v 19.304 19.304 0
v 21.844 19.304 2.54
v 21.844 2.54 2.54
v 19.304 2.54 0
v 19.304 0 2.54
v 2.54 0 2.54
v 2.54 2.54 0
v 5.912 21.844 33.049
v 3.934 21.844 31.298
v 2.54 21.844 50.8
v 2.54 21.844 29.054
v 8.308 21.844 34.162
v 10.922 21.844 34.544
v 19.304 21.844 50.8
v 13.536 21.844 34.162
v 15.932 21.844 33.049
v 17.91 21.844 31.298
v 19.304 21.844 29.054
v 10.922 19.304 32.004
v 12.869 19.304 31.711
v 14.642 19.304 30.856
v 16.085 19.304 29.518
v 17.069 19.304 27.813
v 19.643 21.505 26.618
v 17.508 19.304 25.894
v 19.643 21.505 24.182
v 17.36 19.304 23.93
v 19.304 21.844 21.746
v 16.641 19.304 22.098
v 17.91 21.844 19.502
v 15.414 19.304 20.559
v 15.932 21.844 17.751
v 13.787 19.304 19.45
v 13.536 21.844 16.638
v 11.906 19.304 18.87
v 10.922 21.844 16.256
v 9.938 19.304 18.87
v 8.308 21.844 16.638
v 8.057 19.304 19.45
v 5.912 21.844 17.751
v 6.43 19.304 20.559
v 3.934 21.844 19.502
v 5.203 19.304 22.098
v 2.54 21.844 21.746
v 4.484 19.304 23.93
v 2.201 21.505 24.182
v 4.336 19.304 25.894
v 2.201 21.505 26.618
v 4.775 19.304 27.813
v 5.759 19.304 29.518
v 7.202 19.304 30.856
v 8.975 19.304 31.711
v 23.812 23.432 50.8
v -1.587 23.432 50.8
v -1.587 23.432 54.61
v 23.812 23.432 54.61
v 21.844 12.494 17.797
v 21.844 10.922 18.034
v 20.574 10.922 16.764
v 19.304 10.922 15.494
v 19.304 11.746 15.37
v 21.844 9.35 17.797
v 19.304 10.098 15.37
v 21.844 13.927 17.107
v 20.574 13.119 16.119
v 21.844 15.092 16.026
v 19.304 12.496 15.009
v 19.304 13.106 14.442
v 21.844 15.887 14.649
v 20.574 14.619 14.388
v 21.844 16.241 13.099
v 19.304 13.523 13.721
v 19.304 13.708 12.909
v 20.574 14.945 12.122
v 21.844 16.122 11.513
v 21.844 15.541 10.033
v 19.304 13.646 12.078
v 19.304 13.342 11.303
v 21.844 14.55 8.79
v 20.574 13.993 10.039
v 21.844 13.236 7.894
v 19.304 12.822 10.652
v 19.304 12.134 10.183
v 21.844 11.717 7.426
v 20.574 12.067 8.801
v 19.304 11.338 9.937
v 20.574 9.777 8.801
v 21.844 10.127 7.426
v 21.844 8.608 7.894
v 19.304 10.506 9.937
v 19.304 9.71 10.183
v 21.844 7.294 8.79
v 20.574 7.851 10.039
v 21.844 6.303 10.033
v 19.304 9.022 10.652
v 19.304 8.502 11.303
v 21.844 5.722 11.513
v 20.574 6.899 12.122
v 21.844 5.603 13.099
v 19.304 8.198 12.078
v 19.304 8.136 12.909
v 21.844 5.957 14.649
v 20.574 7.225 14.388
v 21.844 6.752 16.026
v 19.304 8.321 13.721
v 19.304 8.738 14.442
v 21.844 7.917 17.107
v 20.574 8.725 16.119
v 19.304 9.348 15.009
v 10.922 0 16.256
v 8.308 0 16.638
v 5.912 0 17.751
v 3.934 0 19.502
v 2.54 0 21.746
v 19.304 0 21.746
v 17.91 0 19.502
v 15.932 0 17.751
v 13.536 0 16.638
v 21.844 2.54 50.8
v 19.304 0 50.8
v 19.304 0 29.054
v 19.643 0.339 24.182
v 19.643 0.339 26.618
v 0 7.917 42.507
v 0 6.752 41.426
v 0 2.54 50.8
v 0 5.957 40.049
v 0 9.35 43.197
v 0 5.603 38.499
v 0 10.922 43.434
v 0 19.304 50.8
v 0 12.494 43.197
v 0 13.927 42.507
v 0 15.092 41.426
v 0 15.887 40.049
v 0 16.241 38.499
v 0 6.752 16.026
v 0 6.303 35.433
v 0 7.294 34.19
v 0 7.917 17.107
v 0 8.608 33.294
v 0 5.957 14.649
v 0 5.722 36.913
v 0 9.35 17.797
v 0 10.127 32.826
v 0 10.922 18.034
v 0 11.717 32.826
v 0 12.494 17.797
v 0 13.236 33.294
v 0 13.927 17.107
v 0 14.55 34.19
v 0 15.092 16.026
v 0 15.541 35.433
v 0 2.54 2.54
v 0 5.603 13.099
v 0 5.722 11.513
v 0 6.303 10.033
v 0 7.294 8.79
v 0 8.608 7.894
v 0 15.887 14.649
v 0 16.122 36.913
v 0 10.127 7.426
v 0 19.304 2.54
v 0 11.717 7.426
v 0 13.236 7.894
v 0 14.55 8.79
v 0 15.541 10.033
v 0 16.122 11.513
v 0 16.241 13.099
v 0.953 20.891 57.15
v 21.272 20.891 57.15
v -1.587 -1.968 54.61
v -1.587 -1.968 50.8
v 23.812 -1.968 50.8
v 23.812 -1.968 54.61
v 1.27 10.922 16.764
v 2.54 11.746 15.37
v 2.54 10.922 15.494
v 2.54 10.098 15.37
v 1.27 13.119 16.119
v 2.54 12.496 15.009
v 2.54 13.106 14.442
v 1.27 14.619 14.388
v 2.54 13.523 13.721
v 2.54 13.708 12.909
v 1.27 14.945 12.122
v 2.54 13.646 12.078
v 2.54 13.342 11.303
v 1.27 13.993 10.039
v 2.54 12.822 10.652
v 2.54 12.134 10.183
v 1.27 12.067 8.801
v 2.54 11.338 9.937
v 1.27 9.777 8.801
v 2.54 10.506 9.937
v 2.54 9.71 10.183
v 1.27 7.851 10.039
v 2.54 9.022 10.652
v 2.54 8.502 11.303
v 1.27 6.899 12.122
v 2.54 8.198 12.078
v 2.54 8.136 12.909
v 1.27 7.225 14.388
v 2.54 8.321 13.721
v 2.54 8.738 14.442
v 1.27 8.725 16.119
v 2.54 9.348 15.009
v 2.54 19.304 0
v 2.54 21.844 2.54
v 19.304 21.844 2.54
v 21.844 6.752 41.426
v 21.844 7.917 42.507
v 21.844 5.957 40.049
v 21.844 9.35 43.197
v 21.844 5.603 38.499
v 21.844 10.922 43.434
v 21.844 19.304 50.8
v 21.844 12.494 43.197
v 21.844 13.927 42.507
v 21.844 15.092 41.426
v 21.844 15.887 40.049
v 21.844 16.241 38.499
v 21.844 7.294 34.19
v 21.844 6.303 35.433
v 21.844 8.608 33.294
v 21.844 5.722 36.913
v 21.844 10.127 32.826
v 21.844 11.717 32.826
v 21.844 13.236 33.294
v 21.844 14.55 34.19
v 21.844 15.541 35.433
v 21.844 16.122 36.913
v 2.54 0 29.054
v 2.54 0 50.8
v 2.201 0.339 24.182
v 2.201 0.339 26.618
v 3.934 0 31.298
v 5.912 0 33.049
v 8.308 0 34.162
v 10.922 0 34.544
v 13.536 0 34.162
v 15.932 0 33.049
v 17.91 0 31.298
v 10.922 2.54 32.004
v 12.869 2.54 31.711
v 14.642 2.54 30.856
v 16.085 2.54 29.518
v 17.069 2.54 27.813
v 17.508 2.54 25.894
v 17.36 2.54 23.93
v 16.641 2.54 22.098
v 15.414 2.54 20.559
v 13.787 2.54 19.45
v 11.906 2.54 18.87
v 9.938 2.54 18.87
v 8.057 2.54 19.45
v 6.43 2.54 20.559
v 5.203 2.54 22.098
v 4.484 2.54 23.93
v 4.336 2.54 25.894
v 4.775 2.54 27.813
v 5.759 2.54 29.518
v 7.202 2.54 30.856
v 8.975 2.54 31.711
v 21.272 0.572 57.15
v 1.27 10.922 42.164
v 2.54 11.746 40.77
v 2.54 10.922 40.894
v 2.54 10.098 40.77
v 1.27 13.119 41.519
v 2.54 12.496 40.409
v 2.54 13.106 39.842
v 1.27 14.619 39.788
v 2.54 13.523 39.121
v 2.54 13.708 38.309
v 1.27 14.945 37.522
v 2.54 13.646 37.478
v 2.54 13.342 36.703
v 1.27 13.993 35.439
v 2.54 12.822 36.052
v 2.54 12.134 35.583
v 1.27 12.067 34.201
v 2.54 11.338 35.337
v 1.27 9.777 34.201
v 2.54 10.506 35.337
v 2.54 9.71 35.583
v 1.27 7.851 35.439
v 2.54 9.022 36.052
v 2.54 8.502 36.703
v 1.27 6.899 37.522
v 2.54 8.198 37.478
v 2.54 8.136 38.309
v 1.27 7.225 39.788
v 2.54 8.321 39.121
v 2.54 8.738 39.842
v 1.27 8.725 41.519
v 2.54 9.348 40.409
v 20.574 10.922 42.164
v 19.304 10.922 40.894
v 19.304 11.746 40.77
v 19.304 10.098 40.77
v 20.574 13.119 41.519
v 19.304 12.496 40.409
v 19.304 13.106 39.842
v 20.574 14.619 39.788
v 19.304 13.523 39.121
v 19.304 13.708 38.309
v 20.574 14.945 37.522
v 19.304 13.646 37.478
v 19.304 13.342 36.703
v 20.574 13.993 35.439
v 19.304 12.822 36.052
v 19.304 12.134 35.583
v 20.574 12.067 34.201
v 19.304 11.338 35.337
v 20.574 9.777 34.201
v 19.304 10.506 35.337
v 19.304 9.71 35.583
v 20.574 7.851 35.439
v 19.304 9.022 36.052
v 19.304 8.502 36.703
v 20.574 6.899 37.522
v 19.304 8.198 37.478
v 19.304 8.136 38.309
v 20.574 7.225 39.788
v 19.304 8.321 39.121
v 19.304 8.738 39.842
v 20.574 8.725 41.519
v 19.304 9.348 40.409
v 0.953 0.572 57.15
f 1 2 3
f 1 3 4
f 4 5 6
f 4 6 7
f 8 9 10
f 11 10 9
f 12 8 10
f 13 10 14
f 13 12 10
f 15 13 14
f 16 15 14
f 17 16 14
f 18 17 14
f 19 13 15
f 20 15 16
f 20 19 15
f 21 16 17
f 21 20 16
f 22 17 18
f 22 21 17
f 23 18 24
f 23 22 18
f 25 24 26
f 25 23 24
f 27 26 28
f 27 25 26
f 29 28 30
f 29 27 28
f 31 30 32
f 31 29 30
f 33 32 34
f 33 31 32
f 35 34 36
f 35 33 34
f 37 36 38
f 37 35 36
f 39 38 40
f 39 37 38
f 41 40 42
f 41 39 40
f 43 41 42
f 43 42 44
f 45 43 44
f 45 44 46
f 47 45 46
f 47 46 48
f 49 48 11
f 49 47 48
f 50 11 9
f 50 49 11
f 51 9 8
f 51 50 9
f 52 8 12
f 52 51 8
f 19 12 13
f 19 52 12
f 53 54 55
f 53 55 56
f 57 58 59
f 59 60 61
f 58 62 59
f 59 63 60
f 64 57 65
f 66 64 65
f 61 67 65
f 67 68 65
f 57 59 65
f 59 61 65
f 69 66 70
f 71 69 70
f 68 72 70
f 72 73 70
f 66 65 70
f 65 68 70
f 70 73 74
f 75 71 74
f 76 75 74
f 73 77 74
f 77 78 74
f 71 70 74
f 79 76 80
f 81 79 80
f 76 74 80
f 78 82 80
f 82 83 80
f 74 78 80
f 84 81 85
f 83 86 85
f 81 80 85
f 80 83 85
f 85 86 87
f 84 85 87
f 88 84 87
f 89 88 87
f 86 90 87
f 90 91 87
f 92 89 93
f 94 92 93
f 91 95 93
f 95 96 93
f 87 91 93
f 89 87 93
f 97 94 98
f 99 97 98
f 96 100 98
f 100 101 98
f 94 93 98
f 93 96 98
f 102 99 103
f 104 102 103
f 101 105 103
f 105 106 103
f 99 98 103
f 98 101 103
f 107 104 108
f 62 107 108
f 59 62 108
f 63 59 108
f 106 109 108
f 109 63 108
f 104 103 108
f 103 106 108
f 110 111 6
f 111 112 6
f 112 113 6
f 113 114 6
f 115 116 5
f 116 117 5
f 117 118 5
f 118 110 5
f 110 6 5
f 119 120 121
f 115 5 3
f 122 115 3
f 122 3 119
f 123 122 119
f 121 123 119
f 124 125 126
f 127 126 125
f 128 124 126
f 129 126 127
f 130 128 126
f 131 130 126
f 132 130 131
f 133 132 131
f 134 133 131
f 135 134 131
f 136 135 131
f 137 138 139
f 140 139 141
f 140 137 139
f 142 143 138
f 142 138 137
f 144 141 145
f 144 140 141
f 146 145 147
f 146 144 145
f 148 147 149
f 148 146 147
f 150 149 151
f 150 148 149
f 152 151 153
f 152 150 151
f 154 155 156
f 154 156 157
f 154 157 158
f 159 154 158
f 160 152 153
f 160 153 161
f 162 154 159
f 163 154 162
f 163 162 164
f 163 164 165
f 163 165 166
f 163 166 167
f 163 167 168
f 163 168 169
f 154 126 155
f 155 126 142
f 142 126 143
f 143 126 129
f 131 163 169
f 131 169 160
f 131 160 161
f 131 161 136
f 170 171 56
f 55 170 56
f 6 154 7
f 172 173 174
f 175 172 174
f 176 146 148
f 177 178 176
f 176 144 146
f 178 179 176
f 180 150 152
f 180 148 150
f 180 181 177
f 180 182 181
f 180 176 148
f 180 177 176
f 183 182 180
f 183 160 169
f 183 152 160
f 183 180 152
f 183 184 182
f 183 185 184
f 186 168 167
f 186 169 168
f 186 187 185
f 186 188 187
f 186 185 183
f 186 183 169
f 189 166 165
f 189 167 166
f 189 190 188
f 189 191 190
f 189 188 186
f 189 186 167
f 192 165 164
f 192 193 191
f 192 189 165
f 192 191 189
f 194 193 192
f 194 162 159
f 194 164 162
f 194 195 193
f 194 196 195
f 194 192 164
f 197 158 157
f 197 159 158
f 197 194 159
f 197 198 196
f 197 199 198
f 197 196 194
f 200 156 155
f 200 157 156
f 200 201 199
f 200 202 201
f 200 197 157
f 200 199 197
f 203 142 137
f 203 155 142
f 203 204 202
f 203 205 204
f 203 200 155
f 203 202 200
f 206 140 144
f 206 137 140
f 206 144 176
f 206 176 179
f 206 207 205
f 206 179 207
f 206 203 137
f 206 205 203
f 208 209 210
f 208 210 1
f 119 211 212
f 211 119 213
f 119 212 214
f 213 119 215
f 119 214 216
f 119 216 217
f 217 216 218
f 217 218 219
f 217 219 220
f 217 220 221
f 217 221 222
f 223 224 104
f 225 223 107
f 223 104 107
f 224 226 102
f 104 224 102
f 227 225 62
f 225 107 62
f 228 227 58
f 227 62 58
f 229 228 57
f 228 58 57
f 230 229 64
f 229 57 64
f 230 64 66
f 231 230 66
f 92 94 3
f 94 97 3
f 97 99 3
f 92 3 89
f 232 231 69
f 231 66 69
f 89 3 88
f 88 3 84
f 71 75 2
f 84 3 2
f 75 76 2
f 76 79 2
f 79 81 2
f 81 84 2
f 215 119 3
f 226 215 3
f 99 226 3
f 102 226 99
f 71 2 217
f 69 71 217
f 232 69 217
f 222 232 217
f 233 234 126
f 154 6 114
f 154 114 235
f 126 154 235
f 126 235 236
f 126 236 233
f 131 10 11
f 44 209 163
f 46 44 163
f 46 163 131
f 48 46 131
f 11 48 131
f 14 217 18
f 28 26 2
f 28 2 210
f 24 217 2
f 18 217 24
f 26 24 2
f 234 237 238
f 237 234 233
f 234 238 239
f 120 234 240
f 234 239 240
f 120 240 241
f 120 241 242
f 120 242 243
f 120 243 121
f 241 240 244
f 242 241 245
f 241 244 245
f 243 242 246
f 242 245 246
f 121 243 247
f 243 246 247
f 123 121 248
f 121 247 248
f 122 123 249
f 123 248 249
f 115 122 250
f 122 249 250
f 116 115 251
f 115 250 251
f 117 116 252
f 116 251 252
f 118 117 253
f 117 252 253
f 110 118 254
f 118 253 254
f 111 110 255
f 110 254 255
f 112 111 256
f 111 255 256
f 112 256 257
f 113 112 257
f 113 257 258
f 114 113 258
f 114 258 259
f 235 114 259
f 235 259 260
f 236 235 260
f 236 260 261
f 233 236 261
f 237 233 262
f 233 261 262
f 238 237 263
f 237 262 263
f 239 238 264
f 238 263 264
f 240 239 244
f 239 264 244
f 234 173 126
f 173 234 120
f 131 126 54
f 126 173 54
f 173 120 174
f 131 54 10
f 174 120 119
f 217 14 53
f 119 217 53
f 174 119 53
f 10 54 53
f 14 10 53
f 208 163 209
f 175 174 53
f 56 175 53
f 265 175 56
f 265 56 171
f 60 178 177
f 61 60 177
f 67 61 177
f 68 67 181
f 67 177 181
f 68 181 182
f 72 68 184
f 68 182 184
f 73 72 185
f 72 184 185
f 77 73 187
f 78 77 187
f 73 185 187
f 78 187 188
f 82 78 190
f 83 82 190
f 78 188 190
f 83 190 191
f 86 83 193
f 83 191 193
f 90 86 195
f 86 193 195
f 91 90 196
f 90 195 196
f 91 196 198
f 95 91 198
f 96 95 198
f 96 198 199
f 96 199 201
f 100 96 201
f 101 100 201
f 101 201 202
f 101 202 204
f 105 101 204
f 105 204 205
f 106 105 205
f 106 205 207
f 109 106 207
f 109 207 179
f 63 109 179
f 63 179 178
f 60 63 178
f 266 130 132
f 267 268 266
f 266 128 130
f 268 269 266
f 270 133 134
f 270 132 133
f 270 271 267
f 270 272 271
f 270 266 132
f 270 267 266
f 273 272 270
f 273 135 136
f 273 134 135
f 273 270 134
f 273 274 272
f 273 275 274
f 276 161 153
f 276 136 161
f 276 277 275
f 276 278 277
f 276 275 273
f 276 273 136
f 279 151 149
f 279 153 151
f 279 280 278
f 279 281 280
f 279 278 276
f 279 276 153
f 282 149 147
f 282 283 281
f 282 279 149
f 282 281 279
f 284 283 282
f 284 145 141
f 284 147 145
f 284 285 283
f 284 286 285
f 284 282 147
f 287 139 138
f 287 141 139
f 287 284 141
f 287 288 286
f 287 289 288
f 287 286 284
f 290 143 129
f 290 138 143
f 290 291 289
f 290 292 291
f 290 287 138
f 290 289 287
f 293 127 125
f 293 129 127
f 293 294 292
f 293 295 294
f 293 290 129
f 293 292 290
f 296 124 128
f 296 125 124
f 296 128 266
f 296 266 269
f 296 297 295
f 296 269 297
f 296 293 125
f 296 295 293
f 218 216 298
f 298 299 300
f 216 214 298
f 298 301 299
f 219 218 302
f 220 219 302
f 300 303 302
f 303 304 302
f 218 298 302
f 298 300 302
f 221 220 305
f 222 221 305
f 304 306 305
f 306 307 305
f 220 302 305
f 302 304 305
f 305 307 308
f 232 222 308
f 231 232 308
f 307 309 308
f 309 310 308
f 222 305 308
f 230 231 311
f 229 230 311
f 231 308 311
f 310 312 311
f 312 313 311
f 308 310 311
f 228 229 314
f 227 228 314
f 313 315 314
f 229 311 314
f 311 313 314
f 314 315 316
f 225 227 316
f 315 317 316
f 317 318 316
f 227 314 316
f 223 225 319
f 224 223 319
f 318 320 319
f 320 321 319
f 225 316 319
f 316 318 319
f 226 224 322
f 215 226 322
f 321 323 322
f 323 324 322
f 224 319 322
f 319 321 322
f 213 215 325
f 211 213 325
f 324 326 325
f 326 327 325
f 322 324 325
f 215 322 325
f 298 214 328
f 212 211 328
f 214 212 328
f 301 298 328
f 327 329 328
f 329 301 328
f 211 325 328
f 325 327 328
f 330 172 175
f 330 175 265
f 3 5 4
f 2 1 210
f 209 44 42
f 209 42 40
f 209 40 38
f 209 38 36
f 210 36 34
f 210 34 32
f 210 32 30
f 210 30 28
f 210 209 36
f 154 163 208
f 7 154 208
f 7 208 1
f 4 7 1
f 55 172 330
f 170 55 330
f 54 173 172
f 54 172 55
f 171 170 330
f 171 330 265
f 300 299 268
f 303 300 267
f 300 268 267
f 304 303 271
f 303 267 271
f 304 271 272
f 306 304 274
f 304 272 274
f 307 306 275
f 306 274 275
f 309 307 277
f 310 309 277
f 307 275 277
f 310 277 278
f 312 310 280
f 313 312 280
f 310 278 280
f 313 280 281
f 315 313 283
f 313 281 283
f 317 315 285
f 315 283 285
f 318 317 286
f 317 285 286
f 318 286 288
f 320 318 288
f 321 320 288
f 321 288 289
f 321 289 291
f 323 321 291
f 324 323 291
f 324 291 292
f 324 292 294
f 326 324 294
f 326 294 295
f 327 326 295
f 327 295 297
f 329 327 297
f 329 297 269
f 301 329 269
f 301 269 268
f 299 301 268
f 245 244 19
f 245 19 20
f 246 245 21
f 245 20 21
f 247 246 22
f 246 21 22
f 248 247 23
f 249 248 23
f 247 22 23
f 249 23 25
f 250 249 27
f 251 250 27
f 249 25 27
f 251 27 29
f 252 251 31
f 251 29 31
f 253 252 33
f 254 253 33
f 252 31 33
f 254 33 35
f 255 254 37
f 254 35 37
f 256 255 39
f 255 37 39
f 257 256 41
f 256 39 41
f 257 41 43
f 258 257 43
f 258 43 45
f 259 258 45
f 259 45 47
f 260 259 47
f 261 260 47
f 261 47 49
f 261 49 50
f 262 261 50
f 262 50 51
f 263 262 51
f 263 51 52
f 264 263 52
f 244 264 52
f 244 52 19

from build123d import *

# Parameters (mm, degrees)
SKETCH1_W           = 21.844
SKETCH1_H           = 21.844
BOSS_EXTRUDE2_DEPTH = 50.8
SKETCH2_W           = 25.4
SKETCH2_H           = 25.4
BOSS_EXTRUDE3_DEPTH = 6.35
SKETCH4_R           = 2.794
CUT_EXTRUDE2_DEPTH  = 67.198133271
SKETCH5_R           = 6.604
CUT_EXTRUDE3_DEPTH  = 67.33394917


with BuildPart() as part:
    # Sketch1 → Boss-Extrude2 (new body)
    with BuildSketch(Plane.XY):
        with Locations((10.922, 10.922)):
            Rectangle(SKETCH1_W, SKETCH1_H)
    extrude(amount=BOSS_EXTRUDE2_DEPTH)

    # Sketch2 → Boss-Extrude3 (add)
    with BuildSketch(Plane.XY.offset(50.8)):
        with Locations((11.1125, 10.7315)):
            Rectangle(SKETCH2_W, SKETCH2_H)
    extrude(amount=BOSS_EXTRUDE3_DEPTH)

    # Sketch4 → Cut-Extrude2 (cut, through all)
    with BuildSketch(Plane.ZY):
        with Locations((38.1, 10.922)):
            Circle(SKETCH4_R)
        with Locations((12.7, 10.922)):
            Circle(SKETCH4_R)
    extrude(amount=-CUT_EXTRUDE2_DEPTH, mode=Mode.SUBTRACT)

    # Sketch5 → Cut-Extrude3 (cut, through all)
    with BuildSketch(Plane(origin=(0, 21.844, 0), x_dir=(1, 0, 0), z_dir=(0, 1, 0))):
        with Locations(Location((10.922, -25.4, 0), (0, 0, 270))):
            Circle(SKETCH5_R)
    extrude(amount=-CUT_EXTRUDE3_DEPTH, mode=Mode.SUBTRACT)

    # Chamfer2
    # the kernel refuses this chamfer: 2.54 mm, written as the material it takes off along each edge
    with BuildSketch(Plane(origin=(20.150666667, 20.150666667, 1.693333333), x_dir=(0, -0.7071067811865474, -0.7071067811865477), z_dir=(0.5773502691896258, 0.5773502691896258, -0.5773502691896255)), Plane(origin=(1.693333333, 20.150666667, 1.693333333), x_dir=(-0.7071067811865476, -0.7071067811865476, 0), z_dir=(-0.5773502691896257, 0.5773502691896257, -0.5773502691896258)), Plane(origin=(20.150666667, 1.693333333, 1.693333333), x_dir=(0, -0.7071067811865476, 0.7071067811865474), z_dir=(0.5773502691896257, -0.5773502691896256, -0.5773502691896257))) as chamfer2_piece_1:
        Polygon((-1.796051224, 1.036950658), (1.796051224, 1.036950658), (0, -2.073901316), align=None)
    extrude(amount=3.226233304, mode=Mode.SUBTRACT)
    with BuildSketch(Plane(origin=(1.693333333, 1.693333333, 1.693333333), x_dir=(0.7071067811865476, 0, -0.7071067811865474), z_dir=(-0.5773502691896255, -0.5773502691896256, -0.5773502691896261))) as chamfer2_piece_2:
        Polygon((-1.796051224, -1.036950658), (1.796051224, -1.036950658), (0, 2.073901316), align=None)
    extrude(amount=3.226233304, mode=Mode.SUBTRACT)
    with BuildSketch(Plane(origin=(-1.5875, 29.963574789, 57.15), x_dir=(-0.027495876610586334, 0, -0.9996219169112968), z_dir=(0, -1, 0)), Plane(origin=(-8.119574789, -1.9685, 57.15), x_dir=(0, -0.02749587661058642, -0.9996219169112968), z_dir=(1, 0, 0)), Plane(origin=(23.8125, -8.500574789, 57.15), x_dir=(0.02749587661058591, 0, -0.9996219169112968), z_dir=(0, 1, 0))) as chamfer2_piece_3:
        with BuildLine():
            Line((2.612829916, 0), (-0.143629773, 2.608879196))
            Line((-0.143629773, 2.608879196), (-0.194410567, 2.607482405))
            ThreePointArc((-0.194410567, 2.607482405), (-0.086688237, 1.304030487), (-0.050780793, -0.001396791))
            Line((-0.050780793, -0.001396791), (0.001396791, -0.050780793))
            ThreePointArc((0.001396791, -0.050780793), (1.306824068, -0.01487335), (2.614226706, -0.050780793))
            Line((2.614226706, -0.050780793), (2.612829916, 0))
        make_face()
    extrude(amount=38.464149579, mode=Mode.SUBTRACT)
    with BuildSketch(Plane(origin=(30.344574789, 23.4315, 57.15), x_dir=(0, -0.9996219169112966, 0.027495876610587302), z_dir=(-1, 0, 0))) as chamfer2_piece_4:
        with BuildLine():
            Line((2.612829916, 0), (-0.143629773, -2.608879196))
            Line((-0.143629773, -2.608879196), (-0.194410567, -2.607482405))
            ThreePointArc((-0.194410567, -2.607482405), (-0.086688237, -1.304030487), (-0.050780793, 0.001396791))
            Line((-0.050780793, 0.001396791), (0.001396791, 0.050780793))
            ThreePointArc((0.001396791, 0.050780793), (1.306824068, 0.01487335), (2.614226706, 0.050780793))
            Line((2.614226706, 0.050780793), (2.612829916, 0))
        make_face()
    extrude(amount=38.464149579, mode=Mode.SUBTRACT)
    with BuildSketch(Plane(origin=(21.844, 10.922, 38.1), x_dir=(0, 0, 1), z_dir=(0, -1, 0))) as chamfer2_piece_5:
        with BuildLine():
            Line((5.405842049, -0.071842049), (2.722157951, 2.611842049))
            Line((2.722157951, 2.611842049), (2.671357951, 2.611842049))
            ThreePointArc((2.671357951, 2.611842049), (2.7432, 1.305921024), (2.7432, 0))
            Line((2.7432, 0), (2.794, -0.0508))
            ThreePointArc((2.794, -0.0508), (4.099921024, -0.0508), (5.405842049, -0.122642049))
            Line((5.405842049, -0.122642049), (5.405842049, -0.071842049))
        make_face()
    revolve(axis=Axis((21.844, 10.922, 38.1), (-1, 0, 0)), mode=Mode.SUBTRACT)
    with BuildSketch(Plane(origin=(0, 10.922, 38.1), x_dir=(0, 0, 1), z_dir=(0, -1, 0))) as chamfer2_piece_6:
        with BuildLine():
            Line((5.405842049, 0.071842049), (2.722157951, -2.611842049))
            Line((2.722157951, -2.611842049), (2.671357951, -2.611842049))
            ThreePointArc((2.671357951, -2.611842049), (2.7432, -1.305921024), (2.7432, 0))
            Line((2.7432, 0), (2.794, 0.0508))
            ThreePointArc((2.794, 0.0508), (4.099921024, 0.0508), (5.405842049, 0.122642049))
            Line((5.405842049, 0.122642049), (5.405842049, 0.071842049))
        make_face()
    revolve(axis=Axis((0, 10.922, 38.1), (-1, 0, 0)), mode=Mode.SUBTRACT)
    with BuildSketch(Plane(origin=(21.844, 10.922, 12.7), x_dir=(0, 0, 1), z_dir=(0, -1, 0))) as chamfer2_piece_7:
        with BuildLine():
            Line((5.405842049, -0.071842049), (2.722157951, 2.611842049))
            Line((2.722157951, 2.611842049), (2.671357951, 2.611842049))
            ThreePointArc((2.671357951, 2.611842049), (2.7432, 1.305921024), (2.7432, 0))
            Line((2.7432, 0), (2.794, -0.0508))
            ThreePointArc((2.794, -0.0508), (4.099921024, -0.0508), (5.405842049, -0.122642049))
            Line((5.405842049, -0.122642049), (5.405842049, -0.071842049))
        make_face()
    revolve(axis=Axis((21.844, 10.922, 12.7), (-1, 0, 0)), mode=Mode.SUBTRACT)
    with BuildSketch(Plane(origin=(0, 10.922, 12.7), x_dir=(0, 0, 1), z_dir=(0, -1, 0))) as chamfer2_piece_8:
        with BuildLine():
            Line((5.405842049, 0.071842049), (2.722157951, -2.611842049))
            Line((2.722157951, -2.611842049), (2.671357951, -2.611842049))
            ThreePointArc((2.671357951, -2.611842049), (2.7432, -1.305921024), (2.7432, 0))
            Line((2.7432, 0), (2.794, 0.0508))
            ThreePointArc((2.794, 0.0508), (4.099921024, 0.0508), (5.405842049, 0.122642049))
            Line((5.405842049, 0.122642049), (5.405842049, 0.071842049))
        make_face()
    revolve(axis=Axis((0, 10.922, 12.7), (-1, 0, 0)), mode=Mode.SUBTRACT)
    with BuildSketch(Plane(origin=(10.922, 0, 25.4), x_dir=(0, 0, 1), z_dir=(-1, 0, 0))) as chamfer2_piece_9:
        with BuildLine():
            Line((9.215842049, -0.071842049), (6.532157951, 2.611842049))
            Line((6.532157951, 2.611842049), (6.481357951, 2.611842049))
            ThreePointArc((6.481357951, 2.611842049), (6.5532, 1.305921024), (6.5532, 0))
            Line((6.5532, 0), (6.604, -0.0508))
            ThreePointArc((6.604, -0.0508), (7.909921024, -0.0508), (9.215842049, -0.122642049))
            Line((9.215842049, -0.122642049), (9.215842049, -0.071842049))
        make_face()
    revolve(axis=Axis((10.922, 0, 25.4), (0, 1, 0)), mode=Mode.SUBTRACT)
    with BuildSketch(Plane(origin=(10.922, 21.844, 25.4), x_dir=(0, 0, 1), z_dir=(-1, 0, 0))) as chamfer2_piece_10:
        with BuildLine():
            Line((9.215842049, 0.071842049), (6.532157951, -2.611842049))
            Line((6.532157951, -2.611842049), (6.481357951, -2.611842049))
            ThreePointArc((6.481357951, -2.611842049), (6.5532, -1.305921024), (6.5532, 0))
            Line((6.5532, 0), (6.604, 0.0508))
            ThreePointArc((6.604, 0.0508), (7.909921024, 0.0508), (9.215842049, 0.122642049))
            Line((9.215842049, 0.122642049), (9.215842049, 0.071842049))
        make_face()
    revolve(axis=Axis((10.922, 21.844, 25.4), (0, 1, 0)), mode=Mode.SUBTRACT)
    with BuildSketch(Plane(origin=(28.376074789, 21.844, 0), x_dir=(0, 0.027495876610585925, 0.9996219169112968), z_dir=(-1, 0, 0)), Plane(origin=(21.844, -6.532074789, 0), x_dir=(0.027495876610585925, 0, 0.9996219169112968), z_dir=(0, 1, 0)), Plane(origin=(-6.532074789, 0, 0), x_dir=(0, -0.027495876610586376, 0.9996219169112968), z_dir=(1, 0, 0)), Plane(origin=(0, 28.376074789, 0), x_dir=(-0.027495876610586376, 0, 0.9996219169112968), z_dir=(0, -1, 0))) as chamfer2_piece_11:
        with BuildLine():
            Line((2.612829916, 0), (-0.143629773, -2.608879196))
            Line((-0.143629773, -2.608879196), (-0.194410567, -2.607482405))
            ThreePointArc((-0.194410567, -2.607482405), (-0.086688237, -1.304030487), (-0.050780793, 0.001396791))
            Line((-0.050780793, 0.001396791), (0.001396791, 0.050780793))
            ThreePointArc((0.001396791, 0.050780793), (1.306824068, 0.01487335), (2.614226706, 0.050780793))
            Line((2.614226706, 0.050780793), (2.612829916, 0))
        make_face()
    extrude(amount=34.908149579, mode=Mode.SUBTRACT)
    with BuildSketch(Plane(origin=(0, 21.844, -6.532074789), x_dir=(0.9996219169112968, 0.027495876610585935, 0), z_dir=(0, 0, 1)), Plane(origin=(21.844, 21.844, -6.532074789), x_dir=(0.02749587661058595, -0.9996219169112968, 0), z_dir=(0, 0, 1)), Plane(origin=(21.844, 0, -6.532074789), x_dir=(-0.9996219169112966, -0.0274958766105864, 0), z_dir=(0, 0, 1))) as chamfer2_piece_12:
        with BuildLine():
            Line((2.612829916, 0), (-0.143629773, -2.608879196))
            Line((-0.143629773, -2.608879196), (-0.194410567, -2.607482405))
            ThreePointArc((-0.194410567, -2.607482405), (-0.086688237, -1.304030487), (-0.050780793, 0.001396791))
            Line((-0.050780793, 0.001396791), (0.001396791, 0.050780793))
            ThreePointArc((0.001396791, 0.050780793), (1.306824068, 0.01487335), (2.614226706, 0.050780793))
            Line((2.614226706, 0.050780793), (2.612829916, 0))
        make_face()
    extrude(amount=57.332074789, mode=Mode.SUBTRACT)
    with BuildSketch(Plane(origin=(0, 0, -6.532074789), x_dir=(0.9996219169112966, -0.02749587661058636, 0), z_dir=(0, 0, 1))) as chamfer2_piece_13:
        with BuildLine():
            Line((2.612829916, 0), (-0.143629773, 2.608879196))
            Line((-0.143629773, 2.608879196), (-0.194410567, 2.607482405))
            ThreePointArc((-0.194410567, 2.607482405), (-0.086688237, 1.304030487), (-0.050780793, -0.001396791))
            Line((-0.050780793, -0.001396791), (0.001396791, -0.050780793))
            ThreePointArc((0.001396791, -0.050780793), (1.306824068, -0.01487335), (2.614226706, -0.050780793))
            Line((2.614226706, -0.050780793), (2.612829916, 0))
        make_face()
    extrude(amount=57.332074789, mode=Mode.SUBTRACT)


solid = part.part
